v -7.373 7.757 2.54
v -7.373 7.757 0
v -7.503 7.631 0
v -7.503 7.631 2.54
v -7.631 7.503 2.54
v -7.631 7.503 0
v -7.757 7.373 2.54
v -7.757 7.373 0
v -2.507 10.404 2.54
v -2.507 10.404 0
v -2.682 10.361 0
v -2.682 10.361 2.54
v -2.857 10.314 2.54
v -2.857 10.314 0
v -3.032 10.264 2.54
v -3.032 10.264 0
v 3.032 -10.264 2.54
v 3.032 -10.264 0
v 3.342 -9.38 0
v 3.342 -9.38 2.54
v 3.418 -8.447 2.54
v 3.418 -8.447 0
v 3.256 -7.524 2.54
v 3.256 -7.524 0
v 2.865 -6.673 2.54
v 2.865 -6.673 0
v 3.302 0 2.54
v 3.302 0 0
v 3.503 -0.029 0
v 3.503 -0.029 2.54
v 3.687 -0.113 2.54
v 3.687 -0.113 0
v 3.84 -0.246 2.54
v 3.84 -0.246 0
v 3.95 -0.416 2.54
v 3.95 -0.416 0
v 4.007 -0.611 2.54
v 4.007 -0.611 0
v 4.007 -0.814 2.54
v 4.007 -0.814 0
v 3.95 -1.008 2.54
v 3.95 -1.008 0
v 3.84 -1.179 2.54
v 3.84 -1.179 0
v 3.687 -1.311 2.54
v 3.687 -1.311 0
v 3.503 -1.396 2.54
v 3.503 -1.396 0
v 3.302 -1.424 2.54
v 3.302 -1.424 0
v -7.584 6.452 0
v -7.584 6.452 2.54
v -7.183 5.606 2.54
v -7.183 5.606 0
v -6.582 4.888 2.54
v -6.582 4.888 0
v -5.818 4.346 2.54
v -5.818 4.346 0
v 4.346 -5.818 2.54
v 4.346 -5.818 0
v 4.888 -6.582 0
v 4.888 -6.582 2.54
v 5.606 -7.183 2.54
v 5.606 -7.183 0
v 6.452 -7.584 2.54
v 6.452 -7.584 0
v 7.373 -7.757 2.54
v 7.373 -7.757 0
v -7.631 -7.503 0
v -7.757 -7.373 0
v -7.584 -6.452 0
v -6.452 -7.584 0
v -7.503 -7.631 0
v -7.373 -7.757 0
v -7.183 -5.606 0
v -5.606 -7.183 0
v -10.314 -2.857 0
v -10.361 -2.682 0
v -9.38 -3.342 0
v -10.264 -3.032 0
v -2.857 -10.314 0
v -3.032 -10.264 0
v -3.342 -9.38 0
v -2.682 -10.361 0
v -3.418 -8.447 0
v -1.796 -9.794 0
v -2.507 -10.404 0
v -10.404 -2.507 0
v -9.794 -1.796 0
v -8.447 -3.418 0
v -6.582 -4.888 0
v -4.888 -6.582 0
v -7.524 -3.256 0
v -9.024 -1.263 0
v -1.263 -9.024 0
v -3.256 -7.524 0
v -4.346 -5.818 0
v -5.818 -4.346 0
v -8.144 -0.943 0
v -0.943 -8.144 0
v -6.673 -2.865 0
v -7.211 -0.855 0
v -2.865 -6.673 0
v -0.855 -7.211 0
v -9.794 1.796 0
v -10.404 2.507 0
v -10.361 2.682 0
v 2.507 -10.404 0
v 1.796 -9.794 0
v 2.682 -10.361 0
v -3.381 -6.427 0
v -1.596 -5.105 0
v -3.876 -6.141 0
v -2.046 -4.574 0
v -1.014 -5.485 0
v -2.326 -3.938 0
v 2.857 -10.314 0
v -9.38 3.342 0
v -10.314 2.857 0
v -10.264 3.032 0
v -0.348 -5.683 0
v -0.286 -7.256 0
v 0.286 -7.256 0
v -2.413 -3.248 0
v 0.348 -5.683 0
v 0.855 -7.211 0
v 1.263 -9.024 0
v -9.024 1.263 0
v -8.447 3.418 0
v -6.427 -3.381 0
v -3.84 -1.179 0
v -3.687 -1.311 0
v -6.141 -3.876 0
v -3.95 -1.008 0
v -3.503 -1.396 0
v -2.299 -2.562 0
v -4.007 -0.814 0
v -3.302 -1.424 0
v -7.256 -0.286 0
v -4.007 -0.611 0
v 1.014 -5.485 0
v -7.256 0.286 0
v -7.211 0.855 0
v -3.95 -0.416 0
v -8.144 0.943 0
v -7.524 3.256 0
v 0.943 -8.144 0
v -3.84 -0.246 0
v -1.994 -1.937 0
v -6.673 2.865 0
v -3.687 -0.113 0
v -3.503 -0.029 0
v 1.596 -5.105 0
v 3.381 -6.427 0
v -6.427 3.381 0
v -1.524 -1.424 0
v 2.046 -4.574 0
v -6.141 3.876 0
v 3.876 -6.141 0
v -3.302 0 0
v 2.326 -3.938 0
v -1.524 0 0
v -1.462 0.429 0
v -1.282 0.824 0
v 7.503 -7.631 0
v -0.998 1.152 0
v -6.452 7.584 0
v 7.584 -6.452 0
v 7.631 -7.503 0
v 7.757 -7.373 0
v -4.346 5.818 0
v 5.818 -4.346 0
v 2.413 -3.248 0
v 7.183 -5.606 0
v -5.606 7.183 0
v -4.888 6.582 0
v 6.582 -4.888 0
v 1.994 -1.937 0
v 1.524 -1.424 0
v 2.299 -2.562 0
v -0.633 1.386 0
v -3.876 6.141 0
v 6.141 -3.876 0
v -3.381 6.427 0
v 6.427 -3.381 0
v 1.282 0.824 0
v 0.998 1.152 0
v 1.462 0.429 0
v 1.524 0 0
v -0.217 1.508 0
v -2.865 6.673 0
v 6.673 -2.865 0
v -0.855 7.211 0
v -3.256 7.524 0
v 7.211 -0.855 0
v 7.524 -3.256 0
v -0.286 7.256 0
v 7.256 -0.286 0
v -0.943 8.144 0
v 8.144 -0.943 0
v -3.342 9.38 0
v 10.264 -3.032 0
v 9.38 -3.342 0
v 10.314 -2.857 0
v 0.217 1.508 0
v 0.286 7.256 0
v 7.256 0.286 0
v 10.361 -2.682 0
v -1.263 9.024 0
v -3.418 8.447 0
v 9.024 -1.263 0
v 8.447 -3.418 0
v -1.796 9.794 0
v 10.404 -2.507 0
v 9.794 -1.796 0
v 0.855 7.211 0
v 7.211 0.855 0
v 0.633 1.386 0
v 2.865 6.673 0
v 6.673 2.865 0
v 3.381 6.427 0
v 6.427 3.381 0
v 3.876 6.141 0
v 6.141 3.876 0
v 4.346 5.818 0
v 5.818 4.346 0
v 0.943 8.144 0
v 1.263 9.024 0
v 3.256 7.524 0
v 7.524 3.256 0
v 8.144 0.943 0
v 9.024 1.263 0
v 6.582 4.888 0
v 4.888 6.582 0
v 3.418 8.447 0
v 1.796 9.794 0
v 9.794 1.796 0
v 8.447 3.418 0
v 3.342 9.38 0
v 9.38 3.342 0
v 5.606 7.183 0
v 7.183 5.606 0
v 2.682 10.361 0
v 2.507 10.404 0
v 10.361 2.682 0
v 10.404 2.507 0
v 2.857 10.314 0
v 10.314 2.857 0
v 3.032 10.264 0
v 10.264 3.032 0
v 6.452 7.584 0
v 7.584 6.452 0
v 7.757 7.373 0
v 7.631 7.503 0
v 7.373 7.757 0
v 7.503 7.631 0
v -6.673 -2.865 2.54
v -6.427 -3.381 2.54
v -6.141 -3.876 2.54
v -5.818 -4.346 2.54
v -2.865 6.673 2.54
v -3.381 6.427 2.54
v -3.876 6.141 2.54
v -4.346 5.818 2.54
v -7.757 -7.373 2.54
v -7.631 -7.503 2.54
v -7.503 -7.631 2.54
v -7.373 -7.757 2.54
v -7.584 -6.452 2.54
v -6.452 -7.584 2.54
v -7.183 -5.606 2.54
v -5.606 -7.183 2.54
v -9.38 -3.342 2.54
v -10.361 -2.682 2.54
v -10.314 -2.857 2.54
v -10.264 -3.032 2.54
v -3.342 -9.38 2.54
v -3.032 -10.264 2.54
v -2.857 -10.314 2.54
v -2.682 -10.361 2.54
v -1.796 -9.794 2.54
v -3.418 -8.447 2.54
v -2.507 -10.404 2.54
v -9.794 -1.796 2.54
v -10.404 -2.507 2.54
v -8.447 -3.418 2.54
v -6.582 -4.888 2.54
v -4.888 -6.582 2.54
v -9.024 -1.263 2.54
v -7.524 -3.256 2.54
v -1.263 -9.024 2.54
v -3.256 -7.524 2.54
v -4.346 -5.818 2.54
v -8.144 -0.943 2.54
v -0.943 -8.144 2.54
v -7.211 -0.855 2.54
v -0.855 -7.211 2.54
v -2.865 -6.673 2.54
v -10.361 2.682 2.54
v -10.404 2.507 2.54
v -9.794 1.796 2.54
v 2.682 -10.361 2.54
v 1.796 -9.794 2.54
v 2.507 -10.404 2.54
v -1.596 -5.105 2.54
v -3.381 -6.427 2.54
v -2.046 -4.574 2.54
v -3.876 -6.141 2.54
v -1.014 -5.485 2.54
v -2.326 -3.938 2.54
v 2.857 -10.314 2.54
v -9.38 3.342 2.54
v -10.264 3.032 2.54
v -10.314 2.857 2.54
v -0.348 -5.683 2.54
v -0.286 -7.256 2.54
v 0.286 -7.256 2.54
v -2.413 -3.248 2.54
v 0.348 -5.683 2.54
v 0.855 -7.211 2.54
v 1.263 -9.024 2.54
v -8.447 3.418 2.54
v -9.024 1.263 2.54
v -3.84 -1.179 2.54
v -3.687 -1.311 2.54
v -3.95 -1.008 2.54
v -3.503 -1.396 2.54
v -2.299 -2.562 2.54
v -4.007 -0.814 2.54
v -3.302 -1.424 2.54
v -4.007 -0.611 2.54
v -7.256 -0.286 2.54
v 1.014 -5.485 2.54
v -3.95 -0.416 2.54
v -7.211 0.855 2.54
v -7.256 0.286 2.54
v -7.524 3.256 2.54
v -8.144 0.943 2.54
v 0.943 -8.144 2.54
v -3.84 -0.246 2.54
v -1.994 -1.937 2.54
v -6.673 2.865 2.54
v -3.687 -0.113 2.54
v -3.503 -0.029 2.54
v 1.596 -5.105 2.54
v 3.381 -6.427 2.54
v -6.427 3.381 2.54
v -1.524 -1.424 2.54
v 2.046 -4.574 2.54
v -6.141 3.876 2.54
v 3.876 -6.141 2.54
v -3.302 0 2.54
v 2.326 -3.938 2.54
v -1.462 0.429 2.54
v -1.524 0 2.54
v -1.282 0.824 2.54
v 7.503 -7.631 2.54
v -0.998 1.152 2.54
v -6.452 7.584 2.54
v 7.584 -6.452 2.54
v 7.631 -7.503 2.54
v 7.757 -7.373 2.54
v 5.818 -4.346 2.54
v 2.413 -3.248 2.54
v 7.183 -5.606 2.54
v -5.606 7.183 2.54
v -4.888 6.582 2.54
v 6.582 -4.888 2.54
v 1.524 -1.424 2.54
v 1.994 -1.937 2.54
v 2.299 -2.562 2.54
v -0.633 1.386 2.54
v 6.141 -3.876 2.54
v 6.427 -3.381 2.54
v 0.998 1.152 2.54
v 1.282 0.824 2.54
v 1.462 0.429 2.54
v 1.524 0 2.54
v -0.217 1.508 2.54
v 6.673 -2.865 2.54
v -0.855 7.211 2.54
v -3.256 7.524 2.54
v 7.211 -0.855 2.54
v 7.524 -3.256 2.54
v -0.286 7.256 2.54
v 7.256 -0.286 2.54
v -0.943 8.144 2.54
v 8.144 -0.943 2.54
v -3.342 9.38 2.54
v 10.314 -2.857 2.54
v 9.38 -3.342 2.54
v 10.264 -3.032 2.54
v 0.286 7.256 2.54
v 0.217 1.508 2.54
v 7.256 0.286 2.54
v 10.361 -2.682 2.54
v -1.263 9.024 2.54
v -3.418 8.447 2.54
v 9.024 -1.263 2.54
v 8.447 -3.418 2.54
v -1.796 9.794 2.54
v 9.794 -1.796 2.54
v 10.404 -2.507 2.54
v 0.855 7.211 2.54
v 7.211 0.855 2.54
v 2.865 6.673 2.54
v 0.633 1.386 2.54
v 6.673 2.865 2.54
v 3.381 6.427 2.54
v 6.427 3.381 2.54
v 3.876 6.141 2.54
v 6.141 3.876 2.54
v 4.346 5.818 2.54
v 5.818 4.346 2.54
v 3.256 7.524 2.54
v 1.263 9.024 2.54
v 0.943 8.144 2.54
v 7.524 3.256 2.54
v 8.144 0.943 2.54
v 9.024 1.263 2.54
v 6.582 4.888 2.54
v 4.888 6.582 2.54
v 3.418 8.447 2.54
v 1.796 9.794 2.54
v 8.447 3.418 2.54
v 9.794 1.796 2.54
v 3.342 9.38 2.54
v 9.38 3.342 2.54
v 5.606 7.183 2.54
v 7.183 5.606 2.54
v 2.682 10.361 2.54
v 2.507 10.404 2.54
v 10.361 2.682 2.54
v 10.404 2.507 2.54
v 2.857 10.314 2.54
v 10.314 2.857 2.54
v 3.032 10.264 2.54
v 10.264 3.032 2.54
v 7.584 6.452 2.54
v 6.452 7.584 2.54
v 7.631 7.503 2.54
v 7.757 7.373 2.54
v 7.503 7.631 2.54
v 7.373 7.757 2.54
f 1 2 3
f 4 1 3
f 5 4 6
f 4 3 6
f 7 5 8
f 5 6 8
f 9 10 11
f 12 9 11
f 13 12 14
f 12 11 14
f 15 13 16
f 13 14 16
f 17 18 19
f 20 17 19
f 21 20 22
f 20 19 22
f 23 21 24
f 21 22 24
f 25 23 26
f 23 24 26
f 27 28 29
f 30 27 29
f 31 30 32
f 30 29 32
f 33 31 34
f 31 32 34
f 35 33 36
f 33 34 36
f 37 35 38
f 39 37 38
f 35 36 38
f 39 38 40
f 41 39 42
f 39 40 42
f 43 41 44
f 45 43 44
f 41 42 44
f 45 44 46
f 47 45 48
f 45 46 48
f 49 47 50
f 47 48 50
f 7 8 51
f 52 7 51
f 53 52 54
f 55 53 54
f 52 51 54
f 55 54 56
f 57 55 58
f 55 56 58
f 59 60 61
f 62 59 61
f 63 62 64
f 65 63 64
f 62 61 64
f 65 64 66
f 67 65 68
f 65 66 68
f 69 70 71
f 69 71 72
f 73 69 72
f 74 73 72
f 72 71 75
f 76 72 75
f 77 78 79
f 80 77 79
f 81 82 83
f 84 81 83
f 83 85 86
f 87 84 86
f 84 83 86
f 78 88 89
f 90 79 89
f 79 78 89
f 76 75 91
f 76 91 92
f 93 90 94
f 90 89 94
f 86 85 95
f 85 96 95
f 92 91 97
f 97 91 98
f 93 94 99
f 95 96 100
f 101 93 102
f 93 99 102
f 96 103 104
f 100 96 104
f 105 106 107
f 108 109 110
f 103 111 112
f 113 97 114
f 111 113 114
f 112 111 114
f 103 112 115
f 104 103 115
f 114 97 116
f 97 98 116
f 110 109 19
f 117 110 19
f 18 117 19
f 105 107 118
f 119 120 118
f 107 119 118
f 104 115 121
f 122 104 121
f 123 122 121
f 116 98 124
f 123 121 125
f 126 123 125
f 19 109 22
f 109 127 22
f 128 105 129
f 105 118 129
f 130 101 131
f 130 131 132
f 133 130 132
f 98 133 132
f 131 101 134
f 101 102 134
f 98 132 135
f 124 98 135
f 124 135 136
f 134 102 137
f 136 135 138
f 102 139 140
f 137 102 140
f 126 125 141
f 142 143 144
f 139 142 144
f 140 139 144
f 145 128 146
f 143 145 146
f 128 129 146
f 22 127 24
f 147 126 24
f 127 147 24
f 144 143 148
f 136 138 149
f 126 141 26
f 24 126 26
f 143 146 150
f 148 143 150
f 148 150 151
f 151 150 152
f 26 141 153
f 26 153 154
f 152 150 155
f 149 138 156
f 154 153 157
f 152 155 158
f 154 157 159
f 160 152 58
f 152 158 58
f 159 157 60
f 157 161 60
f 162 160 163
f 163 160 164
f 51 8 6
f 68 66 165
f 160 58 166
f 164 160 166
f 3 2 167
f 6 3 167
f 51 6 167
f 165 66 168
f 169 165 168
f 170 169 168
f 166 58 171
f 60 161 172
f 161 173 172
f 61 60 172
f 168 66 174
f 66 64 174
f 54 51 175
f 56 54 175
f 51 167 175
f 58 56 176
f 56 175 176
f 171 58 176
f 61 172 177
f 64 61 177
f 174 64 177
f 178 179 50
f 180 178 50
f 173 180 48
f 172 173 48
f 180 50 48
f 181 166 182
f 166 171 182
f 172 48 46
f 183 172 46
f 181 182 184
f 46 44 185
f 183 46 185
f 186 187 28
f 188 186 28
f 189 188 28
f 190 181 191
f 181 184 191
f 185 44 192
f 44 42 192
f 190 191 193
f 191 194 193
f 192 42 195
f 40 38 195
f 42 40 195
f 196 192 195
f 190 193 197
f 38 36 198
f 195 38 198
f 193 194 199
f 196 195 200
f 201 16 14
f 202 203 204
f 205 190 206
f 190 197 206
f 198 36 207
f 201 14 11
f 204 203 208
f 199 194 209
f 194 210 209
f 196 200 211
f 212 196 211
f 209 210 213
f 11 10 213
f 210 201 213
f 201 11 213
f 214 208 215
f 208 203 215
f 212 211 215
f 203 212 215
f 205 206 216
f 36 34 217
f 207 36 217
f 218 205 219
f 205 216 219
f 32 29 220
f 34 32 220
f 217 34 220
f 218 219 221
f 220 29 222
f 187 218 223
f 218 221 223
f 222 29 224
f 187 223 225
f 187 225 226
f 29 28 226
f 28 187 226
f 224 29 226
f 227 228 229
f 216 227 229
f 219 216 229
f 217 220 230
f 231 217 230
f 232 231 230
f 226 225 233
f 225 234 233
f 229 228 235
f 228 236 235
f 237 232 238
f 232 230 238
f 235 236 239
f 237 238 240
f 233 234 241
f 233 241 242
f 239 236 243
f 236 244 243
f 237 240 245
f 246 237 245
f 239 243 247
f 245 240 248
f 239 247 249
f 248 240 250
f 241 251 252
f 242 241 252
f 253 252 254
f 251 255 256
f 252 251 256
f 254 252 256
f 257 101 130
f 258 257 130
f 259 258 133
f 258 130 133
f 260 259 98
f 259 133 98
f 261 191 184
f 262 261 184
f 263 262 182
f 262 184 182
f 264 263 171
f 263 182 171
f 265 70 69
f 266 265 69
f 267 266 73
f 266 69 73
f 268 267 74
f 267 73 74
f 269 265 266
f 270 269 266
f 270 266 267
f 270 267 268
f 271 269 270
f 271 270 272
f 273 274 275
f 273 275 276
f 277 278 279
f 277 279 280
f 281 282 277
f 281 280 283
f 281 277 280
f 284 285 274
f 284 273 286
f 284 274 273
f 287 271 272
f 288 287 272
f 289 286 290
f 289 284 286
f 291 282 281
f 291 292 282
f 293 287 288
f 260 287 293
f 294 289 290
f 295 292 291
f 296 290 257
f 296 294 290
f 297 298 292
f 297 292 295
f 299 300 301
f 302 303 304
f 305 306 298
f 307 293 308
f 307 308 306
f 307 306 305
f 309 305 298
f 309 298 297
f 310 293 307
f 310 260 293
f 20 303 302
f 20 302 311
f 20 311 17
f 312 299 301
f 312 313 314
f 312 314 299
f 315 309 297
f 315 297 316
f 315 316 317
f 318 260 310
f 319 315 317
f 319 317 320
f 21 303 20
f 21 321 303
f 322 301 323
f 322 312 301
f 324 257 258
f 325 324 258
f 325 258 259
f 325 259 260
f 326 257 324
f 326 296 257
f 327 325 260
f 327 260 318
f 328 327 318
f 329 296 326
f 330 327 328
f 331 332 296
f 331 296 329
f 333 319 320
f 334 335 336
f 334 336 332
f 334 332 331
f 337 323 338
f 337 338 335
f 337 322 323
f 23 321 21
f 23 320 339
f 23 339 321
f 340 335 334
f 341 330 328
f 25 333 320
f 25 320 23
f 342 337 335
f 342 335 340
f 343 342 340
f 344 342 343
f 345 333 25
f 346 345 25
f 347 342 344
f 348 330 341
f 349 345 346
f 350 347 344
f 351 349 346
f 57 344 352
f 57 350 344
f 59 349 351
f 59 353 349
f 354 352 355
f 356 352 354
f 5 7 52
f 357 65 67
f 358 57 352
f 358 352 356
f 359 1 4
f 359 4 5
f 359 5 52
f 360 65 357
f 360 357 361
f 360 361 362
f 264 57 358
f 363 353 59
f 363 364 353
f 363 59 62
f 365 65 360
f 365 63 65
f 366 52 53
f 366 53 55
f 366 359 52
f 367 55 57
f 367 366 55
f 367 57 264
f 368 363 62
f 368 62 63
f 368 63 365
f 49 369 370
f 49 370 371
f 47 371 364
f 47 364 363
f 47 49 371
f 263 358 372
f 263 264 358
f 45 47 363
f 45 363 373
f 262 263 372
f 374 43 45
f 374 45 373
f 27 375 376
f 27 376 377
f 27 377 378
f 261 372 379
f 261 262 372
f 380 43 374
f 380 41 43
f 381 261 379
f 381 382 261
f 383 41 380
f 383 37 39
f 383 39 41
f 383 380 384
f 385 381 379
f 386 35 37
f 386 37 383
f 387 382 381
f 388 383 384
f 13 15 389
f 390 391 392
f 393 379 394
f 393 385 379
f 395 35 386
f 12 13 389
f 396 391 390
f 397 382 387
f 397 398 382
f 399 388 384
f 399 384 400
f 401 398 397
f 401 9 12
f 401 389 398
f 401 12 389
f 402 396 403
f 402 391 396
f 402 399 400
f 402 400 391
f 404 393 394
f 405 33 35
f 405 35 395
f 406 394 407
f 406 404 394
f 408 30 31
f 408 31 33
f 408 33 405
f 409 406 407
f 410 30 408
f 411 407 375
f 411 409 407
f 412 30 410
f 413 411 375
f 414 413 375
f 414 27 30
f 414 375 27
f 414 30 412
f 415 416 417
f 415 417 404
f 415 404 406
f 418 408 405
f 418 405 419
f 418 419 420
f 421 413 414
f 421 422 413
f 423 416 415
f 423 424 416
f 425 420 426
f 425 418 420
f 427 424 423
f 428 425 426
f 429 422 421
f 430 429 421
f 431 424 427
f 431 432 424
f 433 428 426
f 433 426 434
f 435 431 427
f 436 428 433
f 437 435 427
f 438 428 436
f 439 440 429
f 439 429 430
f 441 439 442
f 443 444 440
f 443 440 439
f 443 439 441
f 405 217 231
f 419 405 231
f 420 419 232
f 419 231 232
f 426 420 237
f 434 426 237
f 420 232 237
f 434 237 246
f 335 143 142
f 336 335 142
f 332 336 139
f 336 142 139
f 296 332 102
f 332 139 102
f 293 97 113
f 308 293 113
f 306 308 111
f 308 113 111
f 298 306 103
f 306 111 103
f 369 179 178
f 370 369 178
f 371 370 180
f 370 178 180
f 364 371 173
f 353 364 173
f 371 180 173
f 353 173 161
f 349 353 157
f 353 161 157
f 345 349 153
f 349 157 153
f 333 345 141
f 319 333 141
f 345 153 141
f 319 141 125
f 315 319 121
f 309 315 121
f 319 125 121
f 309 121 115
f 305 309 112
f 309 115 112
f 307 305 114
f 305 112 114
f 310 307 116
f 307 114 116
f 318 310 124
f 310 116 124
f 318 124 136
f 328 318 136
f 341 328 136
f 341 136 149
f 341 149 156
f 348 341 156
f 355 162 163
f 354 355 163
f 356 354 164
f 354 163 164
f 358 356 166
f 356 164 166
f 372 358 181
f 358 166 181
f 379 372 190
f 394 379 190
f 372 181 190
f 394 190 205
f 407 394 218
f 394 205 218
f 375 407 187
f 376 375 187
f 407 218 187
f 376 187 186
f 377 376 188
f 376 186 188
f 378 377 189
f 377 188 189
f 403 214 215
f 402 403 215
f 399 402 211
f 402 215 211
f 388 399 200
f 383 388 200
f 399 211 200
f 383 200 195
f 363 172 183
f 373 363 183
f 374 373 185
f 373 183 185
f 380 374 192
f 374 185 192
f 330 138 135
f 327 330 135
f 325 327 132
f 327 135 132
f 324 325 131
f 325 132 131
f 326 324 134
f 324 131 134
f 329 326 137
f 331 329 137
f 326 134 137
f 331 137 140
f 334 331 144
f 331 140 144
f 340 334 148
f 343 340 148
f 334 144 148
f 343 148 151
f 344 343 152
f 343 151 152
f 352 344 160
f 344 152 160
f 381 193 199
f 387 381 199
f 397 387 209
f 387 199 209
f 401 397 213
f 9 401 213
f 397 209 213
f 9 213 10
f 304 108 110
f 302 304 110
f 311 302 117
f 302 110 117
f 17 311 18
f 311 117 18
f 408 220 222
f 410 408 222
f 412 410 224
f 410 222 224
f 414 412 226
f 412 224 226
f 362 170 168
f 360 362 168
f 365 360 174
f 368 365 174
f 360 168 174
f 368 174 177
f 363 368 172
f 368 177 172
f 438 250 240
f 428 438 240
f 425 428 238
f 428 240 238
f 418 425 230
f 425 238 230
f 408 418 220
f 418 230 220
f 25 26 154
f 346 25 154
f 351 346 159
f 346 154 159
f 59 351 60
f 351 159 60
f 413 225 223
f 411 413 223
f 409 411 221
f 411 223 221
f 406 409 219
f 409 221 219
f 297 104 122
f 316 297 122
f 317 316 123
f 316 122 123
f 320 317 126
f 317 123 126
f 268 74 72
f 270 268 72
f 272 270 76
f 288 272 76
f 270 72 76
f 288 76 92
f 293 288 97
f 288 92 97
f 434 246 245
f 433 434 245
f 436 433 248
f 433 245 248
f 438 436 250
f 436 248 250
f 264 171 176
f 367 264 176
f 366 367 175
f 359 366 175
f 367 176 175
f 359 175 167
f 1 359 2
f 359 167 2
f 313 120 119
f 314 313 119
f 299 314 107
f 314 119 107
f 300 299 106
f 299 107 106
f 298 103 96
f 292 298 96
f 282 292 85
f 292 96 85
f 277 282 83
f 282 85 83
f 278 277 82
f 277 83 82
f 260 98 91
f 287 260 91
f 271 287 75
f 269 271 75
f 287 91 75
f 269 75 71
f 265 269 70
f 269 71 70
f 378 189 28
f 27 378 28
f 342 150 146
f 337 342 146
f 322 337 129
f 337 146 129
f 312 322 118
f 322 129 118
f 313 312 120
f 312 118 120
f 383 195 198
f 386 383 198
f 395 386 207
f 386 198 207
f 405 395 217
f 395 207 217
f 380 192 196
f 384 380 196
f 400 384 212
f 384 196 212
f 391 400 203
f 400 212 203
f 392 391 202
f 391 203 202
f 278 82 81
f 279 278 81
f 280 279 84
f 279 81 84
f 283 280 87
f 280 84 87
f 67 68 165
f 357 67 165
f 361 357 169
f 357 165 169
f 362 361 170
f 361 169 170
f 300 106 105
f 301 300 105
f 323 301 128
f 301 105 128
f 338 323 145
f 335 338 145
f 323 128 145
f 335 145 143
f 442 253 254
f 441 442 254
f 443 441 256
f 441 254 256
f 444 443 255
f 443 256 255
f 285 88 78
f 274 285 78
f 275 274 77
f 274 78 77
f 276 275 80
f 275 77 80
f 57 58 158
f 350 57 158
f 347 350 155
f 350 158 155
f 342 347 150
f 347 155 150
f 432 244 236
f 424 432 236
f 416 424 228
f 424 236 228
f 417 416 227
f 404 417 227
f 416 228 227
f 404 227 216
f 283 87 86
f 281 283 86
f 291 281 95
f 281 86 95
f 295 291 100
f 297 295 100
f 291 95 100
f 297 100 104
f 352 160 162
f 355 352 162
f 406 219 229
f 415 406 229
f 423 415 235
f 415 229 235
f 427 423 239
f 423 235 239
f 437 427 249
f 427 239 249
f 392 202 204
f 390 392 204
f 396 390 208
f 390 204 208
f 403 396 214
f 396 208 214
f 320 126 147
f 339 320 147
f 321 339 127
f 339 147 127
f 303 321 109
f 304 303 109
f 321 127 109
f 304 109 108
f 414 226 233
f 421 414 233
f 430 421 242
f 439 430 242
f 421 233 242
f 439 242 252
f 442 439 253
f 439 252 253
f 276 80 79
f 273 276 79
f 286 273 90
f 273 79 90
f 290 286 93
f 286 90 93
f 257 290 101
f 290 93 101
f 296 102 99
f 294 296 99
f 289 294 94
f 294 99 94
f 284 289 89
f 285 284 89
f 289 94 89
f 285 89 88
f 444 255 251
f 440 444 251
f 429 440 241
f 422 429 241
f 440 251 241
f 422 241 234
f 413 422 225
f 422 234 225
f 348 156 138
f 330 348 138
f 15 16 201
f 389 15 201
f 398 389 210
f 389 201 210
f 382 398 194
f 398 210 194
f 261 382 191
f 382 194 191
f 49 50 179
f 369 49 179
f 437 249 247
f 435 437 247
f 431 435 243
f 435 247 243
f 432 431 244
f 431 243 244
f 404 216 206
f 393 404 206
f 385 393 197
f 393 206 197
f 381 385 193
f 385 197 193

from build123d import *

# Parameters (mm, degrees)
BOSS_EXTRUDE1_DEPTH = 2.54


with BuildPart() as part:
    # Sketch1 → Boss-Extrude1 (new body)
    with BuildSketch(Plane.XY):
        with BuildLine():
            ThreePointArc((-7.372965122, 7.75726334), (-7.56755407, 7.56755407), (-7.75726334, 7.372965122))
            ThreePointArc((-7.75726334, 7.372965122), (-7.183443639, 5.605840676), (-5.817551904, 4.346341719))
            ThreePointArc((-5.817551904, 4.346341719), (-6.288954394, 3.630929512), (-6.672818294, 2.864976877))
            ThreePointArc((-6.672818294, 2.864976877), (-8.446522255, 3.41812434), (-10.263806767, 3.031504555))
            ThreePointArc((-10.263806767, 3.031504555), (-10.337471104, 2.769917034), (-10.404469677, 2.506543427))
            ThreePointArc((-10.404469677, 2.506543427), (-9.023965016, 1.263078615), (-7.211318596, 0.85526639))
            ThreePointArc((-7.211318596, 0.85526639), (-7.261859025, 0), (-7.211318596, -0.85526639))
            ThreePointArc((-7.211318596, -0.85526639), (-9.023965016, -1.263078615), (-10.404469677, -2.506543427))
            ThreePointArc((-10.404469677, -2.506543427), (-10.337471104, -2.769917034), (-10.263806767, -3.031504555))
            ThreePointArc((-10.263806767, -3.031504555), (-8.446522255, -3.41812434), (-6.672818294, -2.864976877))
            ThreePointArc((-6.672818294, -2.864976877), (-6.288954394, -3.630929512), (-5.817551904, -4.346341719))
            ThreePointArc((-5.817551904, -4.346341719), (-7.183443639, -5.605840676), (-7.75726334, -7.372965122))
            ThreePointArc((-7.75726334, -7.372965122), (-7.56755407, -7.56755407), (-7.372965122, -7.75726334))
            ThreePointArc((-7.372965122, -7.75726334), (-5.605840676, -7.183443639), (-4.346341719, -5.817551904))
            ThreePointArc((-4.346341719, -5.817551904), (-3.630929512, -6.288954394), (-2.864976877, -6.672818294))
            ThreePointArc((-2.864976877, -6.672818294), (-3.41812434, -8.446522255), (-3.031504555, -10.263806767))
            ThreePointArc((-3.031504555, -10.263806767), (-2.769917034, -10.337471104), (-2.506543427, -10.404469677))
            ThreePointArc((-2.506543427, -10.404469677), (-1.263078615, -9.023965016), (-0.85526639, -7.211318596))
            ThreePointArc((-0.85526639, -7.211318596), (0, -7.261859025), (0.85526639, -7.211318596))
            ThreePointArc((0.85526639, -7.211318596), (1.263078615, -9.023965016), (2.506543427, -10.404469677))
            ThreePointArc((2.506543427, -10.404469677), (2.769917034, -10.337471104), (3.031504555, -10.263806767))
            ThreePointArc((3.031504555, -10.263806767), (3.41812434, -8.446522255), (2.864976877, -6.672818294))
            ThreePointArc((2.864976877, -6.672818294), (3.630929512, -6.288954394), (4.346341719, -5.817551904))
            ThreePointArc((4.346341719, -5.817551904), (5.605840676, -7.183443639), (7.372965122, -7.75726334))
            ThreePointArc((7.372965122, -7.75726334), (7.56755407, -7.56755407), (7.75726334, -7.372965122))
            ThreePointArc((7.75726334, -7.372965122), (7.183443639, -5.605840676), (5.817551904, -4.346341719))
            ThreePointArc((5.817551904, -4.346341719), (6.288954394, -3.630929512), (6.672818294, -2.864976877))
            ThreePointArc((6.672818294, -2.864976877), (8.446522255, -3.41812434), (10.263806767, -3.031504555))
            ThreePointArc((10.263806767, -3.031504555), (10.337471104, -2.769917034), (10.404469677, -2.506543427))
            ThreePointArc((10.404469677, -2.506543427), (9.023965016, -1.263078615), (7.211318596, -0.85526639))
            ThreePointArc((7.211318596, -0.85526639), (7.261859025, 0), (7.211318596, 0.85526639))
            ThreePointArc((7.211318596, 0.85526639), (9.023965016, 1.263078615), (10.404469677, 2.506543427))
            ThreePointArc((10.404469677, 2.506543427), (10.337471104, 2.769917034), (10.263806767, 3.031504555))
            ThreePointArc((10.263806767, 3.031504555), (8.446522255, 3.41812434), (6.672818294, 2.864976877))
            ThreePointArc((6.672818294, 2.864976877), (6.288954394, 3.630929512), (5.817551904, 4.346341719))
            ThreePointArc((5.817551904, 4.346341719), (7.183443639, 5.605840676), (7.75726334, 7.372965122))
            ThreePointArc((7.75726334, 7.372965122), (7.56755407, 7.56755407), (7.372965122, 7.75726334))
            ThreePointArc((7.372965122, 7.75726334), (5.605840676, 7.183443639), (4.346341719, 5.817551904))
            ThreePointArc((4.346341719, 5.817551904), (3.630929512, 6.288954394), (2.864976877, 6.672818294))
            ThreePointArc((2.864976877, 6.672818294), (3.41812434, 8.446522255), (3.031504555, 10.263806767))
            ThreePointArc((3.031504555, 10.263806767), (2.769917034, 10.337471104), (2.506543427, 10.404469677))
            ThreePointArc((2.506543427, 10.404469677), (1.263078615, 9.023965016), (0.85526639, 7.211318596))
            ThreePointArc((0.85526639, 7.211318596), (0, 7.261859025), (-0.85526639, 7.211318596))
            ThreePointArc((-0.85526639, 7.211318596), (-1.263078615, 9.023965016), (-2.506543427, 10.404469677))
            ThreePointArc((-2.506543427, 10.404469677), (-2.769917034, 10.337471104), (-3.031504555, 10.263806767))
            ThreePointArc((-3.031504555, 10.263806767), (-3.41812434, 8.446522255), (-2.864976877, 6.672818294))
            ThreePointArc((-2.864976877, 6.672818294), (-3.630929512, 6.288954394), (-4.346341719, 5.817551904))
            ThreePointArc((-4.346341719, 5.817551904), (-5.605840676, 7.183443639), (-7.372965122, 7.75726334))
        make_face()
        with BuildLine():
            Line((-1.524, -1.424354318), (-3.302, -1.424354318))
            ThreePointArc((-3.302, -1.424354318), (-4.014177159, -0.712177159), (-3.302, 0))
            Line((-3.302, 0), (-1.524, 0))
            ThreePointArc((-1.524, 0), (0, 1.524), (1.524, 0))
            Line((1.524, 0), (3.302, 0))
            ThreePointArc((3.302, 0), (4.014177159, -0.712177159), (3.302, -1.424354318))
            Line((3.302, -1.424354318), (1.524, -1.424354318))
            ThreePointArc((1.524, -1.424354318), (0, -5.70818114), (-1.524, -1.424354318))
        make_face(mode=Mode.SUBTRACT)
    extrude(amount=BOSS_EXTRUDE1_DEPTH)


solid = part.part
